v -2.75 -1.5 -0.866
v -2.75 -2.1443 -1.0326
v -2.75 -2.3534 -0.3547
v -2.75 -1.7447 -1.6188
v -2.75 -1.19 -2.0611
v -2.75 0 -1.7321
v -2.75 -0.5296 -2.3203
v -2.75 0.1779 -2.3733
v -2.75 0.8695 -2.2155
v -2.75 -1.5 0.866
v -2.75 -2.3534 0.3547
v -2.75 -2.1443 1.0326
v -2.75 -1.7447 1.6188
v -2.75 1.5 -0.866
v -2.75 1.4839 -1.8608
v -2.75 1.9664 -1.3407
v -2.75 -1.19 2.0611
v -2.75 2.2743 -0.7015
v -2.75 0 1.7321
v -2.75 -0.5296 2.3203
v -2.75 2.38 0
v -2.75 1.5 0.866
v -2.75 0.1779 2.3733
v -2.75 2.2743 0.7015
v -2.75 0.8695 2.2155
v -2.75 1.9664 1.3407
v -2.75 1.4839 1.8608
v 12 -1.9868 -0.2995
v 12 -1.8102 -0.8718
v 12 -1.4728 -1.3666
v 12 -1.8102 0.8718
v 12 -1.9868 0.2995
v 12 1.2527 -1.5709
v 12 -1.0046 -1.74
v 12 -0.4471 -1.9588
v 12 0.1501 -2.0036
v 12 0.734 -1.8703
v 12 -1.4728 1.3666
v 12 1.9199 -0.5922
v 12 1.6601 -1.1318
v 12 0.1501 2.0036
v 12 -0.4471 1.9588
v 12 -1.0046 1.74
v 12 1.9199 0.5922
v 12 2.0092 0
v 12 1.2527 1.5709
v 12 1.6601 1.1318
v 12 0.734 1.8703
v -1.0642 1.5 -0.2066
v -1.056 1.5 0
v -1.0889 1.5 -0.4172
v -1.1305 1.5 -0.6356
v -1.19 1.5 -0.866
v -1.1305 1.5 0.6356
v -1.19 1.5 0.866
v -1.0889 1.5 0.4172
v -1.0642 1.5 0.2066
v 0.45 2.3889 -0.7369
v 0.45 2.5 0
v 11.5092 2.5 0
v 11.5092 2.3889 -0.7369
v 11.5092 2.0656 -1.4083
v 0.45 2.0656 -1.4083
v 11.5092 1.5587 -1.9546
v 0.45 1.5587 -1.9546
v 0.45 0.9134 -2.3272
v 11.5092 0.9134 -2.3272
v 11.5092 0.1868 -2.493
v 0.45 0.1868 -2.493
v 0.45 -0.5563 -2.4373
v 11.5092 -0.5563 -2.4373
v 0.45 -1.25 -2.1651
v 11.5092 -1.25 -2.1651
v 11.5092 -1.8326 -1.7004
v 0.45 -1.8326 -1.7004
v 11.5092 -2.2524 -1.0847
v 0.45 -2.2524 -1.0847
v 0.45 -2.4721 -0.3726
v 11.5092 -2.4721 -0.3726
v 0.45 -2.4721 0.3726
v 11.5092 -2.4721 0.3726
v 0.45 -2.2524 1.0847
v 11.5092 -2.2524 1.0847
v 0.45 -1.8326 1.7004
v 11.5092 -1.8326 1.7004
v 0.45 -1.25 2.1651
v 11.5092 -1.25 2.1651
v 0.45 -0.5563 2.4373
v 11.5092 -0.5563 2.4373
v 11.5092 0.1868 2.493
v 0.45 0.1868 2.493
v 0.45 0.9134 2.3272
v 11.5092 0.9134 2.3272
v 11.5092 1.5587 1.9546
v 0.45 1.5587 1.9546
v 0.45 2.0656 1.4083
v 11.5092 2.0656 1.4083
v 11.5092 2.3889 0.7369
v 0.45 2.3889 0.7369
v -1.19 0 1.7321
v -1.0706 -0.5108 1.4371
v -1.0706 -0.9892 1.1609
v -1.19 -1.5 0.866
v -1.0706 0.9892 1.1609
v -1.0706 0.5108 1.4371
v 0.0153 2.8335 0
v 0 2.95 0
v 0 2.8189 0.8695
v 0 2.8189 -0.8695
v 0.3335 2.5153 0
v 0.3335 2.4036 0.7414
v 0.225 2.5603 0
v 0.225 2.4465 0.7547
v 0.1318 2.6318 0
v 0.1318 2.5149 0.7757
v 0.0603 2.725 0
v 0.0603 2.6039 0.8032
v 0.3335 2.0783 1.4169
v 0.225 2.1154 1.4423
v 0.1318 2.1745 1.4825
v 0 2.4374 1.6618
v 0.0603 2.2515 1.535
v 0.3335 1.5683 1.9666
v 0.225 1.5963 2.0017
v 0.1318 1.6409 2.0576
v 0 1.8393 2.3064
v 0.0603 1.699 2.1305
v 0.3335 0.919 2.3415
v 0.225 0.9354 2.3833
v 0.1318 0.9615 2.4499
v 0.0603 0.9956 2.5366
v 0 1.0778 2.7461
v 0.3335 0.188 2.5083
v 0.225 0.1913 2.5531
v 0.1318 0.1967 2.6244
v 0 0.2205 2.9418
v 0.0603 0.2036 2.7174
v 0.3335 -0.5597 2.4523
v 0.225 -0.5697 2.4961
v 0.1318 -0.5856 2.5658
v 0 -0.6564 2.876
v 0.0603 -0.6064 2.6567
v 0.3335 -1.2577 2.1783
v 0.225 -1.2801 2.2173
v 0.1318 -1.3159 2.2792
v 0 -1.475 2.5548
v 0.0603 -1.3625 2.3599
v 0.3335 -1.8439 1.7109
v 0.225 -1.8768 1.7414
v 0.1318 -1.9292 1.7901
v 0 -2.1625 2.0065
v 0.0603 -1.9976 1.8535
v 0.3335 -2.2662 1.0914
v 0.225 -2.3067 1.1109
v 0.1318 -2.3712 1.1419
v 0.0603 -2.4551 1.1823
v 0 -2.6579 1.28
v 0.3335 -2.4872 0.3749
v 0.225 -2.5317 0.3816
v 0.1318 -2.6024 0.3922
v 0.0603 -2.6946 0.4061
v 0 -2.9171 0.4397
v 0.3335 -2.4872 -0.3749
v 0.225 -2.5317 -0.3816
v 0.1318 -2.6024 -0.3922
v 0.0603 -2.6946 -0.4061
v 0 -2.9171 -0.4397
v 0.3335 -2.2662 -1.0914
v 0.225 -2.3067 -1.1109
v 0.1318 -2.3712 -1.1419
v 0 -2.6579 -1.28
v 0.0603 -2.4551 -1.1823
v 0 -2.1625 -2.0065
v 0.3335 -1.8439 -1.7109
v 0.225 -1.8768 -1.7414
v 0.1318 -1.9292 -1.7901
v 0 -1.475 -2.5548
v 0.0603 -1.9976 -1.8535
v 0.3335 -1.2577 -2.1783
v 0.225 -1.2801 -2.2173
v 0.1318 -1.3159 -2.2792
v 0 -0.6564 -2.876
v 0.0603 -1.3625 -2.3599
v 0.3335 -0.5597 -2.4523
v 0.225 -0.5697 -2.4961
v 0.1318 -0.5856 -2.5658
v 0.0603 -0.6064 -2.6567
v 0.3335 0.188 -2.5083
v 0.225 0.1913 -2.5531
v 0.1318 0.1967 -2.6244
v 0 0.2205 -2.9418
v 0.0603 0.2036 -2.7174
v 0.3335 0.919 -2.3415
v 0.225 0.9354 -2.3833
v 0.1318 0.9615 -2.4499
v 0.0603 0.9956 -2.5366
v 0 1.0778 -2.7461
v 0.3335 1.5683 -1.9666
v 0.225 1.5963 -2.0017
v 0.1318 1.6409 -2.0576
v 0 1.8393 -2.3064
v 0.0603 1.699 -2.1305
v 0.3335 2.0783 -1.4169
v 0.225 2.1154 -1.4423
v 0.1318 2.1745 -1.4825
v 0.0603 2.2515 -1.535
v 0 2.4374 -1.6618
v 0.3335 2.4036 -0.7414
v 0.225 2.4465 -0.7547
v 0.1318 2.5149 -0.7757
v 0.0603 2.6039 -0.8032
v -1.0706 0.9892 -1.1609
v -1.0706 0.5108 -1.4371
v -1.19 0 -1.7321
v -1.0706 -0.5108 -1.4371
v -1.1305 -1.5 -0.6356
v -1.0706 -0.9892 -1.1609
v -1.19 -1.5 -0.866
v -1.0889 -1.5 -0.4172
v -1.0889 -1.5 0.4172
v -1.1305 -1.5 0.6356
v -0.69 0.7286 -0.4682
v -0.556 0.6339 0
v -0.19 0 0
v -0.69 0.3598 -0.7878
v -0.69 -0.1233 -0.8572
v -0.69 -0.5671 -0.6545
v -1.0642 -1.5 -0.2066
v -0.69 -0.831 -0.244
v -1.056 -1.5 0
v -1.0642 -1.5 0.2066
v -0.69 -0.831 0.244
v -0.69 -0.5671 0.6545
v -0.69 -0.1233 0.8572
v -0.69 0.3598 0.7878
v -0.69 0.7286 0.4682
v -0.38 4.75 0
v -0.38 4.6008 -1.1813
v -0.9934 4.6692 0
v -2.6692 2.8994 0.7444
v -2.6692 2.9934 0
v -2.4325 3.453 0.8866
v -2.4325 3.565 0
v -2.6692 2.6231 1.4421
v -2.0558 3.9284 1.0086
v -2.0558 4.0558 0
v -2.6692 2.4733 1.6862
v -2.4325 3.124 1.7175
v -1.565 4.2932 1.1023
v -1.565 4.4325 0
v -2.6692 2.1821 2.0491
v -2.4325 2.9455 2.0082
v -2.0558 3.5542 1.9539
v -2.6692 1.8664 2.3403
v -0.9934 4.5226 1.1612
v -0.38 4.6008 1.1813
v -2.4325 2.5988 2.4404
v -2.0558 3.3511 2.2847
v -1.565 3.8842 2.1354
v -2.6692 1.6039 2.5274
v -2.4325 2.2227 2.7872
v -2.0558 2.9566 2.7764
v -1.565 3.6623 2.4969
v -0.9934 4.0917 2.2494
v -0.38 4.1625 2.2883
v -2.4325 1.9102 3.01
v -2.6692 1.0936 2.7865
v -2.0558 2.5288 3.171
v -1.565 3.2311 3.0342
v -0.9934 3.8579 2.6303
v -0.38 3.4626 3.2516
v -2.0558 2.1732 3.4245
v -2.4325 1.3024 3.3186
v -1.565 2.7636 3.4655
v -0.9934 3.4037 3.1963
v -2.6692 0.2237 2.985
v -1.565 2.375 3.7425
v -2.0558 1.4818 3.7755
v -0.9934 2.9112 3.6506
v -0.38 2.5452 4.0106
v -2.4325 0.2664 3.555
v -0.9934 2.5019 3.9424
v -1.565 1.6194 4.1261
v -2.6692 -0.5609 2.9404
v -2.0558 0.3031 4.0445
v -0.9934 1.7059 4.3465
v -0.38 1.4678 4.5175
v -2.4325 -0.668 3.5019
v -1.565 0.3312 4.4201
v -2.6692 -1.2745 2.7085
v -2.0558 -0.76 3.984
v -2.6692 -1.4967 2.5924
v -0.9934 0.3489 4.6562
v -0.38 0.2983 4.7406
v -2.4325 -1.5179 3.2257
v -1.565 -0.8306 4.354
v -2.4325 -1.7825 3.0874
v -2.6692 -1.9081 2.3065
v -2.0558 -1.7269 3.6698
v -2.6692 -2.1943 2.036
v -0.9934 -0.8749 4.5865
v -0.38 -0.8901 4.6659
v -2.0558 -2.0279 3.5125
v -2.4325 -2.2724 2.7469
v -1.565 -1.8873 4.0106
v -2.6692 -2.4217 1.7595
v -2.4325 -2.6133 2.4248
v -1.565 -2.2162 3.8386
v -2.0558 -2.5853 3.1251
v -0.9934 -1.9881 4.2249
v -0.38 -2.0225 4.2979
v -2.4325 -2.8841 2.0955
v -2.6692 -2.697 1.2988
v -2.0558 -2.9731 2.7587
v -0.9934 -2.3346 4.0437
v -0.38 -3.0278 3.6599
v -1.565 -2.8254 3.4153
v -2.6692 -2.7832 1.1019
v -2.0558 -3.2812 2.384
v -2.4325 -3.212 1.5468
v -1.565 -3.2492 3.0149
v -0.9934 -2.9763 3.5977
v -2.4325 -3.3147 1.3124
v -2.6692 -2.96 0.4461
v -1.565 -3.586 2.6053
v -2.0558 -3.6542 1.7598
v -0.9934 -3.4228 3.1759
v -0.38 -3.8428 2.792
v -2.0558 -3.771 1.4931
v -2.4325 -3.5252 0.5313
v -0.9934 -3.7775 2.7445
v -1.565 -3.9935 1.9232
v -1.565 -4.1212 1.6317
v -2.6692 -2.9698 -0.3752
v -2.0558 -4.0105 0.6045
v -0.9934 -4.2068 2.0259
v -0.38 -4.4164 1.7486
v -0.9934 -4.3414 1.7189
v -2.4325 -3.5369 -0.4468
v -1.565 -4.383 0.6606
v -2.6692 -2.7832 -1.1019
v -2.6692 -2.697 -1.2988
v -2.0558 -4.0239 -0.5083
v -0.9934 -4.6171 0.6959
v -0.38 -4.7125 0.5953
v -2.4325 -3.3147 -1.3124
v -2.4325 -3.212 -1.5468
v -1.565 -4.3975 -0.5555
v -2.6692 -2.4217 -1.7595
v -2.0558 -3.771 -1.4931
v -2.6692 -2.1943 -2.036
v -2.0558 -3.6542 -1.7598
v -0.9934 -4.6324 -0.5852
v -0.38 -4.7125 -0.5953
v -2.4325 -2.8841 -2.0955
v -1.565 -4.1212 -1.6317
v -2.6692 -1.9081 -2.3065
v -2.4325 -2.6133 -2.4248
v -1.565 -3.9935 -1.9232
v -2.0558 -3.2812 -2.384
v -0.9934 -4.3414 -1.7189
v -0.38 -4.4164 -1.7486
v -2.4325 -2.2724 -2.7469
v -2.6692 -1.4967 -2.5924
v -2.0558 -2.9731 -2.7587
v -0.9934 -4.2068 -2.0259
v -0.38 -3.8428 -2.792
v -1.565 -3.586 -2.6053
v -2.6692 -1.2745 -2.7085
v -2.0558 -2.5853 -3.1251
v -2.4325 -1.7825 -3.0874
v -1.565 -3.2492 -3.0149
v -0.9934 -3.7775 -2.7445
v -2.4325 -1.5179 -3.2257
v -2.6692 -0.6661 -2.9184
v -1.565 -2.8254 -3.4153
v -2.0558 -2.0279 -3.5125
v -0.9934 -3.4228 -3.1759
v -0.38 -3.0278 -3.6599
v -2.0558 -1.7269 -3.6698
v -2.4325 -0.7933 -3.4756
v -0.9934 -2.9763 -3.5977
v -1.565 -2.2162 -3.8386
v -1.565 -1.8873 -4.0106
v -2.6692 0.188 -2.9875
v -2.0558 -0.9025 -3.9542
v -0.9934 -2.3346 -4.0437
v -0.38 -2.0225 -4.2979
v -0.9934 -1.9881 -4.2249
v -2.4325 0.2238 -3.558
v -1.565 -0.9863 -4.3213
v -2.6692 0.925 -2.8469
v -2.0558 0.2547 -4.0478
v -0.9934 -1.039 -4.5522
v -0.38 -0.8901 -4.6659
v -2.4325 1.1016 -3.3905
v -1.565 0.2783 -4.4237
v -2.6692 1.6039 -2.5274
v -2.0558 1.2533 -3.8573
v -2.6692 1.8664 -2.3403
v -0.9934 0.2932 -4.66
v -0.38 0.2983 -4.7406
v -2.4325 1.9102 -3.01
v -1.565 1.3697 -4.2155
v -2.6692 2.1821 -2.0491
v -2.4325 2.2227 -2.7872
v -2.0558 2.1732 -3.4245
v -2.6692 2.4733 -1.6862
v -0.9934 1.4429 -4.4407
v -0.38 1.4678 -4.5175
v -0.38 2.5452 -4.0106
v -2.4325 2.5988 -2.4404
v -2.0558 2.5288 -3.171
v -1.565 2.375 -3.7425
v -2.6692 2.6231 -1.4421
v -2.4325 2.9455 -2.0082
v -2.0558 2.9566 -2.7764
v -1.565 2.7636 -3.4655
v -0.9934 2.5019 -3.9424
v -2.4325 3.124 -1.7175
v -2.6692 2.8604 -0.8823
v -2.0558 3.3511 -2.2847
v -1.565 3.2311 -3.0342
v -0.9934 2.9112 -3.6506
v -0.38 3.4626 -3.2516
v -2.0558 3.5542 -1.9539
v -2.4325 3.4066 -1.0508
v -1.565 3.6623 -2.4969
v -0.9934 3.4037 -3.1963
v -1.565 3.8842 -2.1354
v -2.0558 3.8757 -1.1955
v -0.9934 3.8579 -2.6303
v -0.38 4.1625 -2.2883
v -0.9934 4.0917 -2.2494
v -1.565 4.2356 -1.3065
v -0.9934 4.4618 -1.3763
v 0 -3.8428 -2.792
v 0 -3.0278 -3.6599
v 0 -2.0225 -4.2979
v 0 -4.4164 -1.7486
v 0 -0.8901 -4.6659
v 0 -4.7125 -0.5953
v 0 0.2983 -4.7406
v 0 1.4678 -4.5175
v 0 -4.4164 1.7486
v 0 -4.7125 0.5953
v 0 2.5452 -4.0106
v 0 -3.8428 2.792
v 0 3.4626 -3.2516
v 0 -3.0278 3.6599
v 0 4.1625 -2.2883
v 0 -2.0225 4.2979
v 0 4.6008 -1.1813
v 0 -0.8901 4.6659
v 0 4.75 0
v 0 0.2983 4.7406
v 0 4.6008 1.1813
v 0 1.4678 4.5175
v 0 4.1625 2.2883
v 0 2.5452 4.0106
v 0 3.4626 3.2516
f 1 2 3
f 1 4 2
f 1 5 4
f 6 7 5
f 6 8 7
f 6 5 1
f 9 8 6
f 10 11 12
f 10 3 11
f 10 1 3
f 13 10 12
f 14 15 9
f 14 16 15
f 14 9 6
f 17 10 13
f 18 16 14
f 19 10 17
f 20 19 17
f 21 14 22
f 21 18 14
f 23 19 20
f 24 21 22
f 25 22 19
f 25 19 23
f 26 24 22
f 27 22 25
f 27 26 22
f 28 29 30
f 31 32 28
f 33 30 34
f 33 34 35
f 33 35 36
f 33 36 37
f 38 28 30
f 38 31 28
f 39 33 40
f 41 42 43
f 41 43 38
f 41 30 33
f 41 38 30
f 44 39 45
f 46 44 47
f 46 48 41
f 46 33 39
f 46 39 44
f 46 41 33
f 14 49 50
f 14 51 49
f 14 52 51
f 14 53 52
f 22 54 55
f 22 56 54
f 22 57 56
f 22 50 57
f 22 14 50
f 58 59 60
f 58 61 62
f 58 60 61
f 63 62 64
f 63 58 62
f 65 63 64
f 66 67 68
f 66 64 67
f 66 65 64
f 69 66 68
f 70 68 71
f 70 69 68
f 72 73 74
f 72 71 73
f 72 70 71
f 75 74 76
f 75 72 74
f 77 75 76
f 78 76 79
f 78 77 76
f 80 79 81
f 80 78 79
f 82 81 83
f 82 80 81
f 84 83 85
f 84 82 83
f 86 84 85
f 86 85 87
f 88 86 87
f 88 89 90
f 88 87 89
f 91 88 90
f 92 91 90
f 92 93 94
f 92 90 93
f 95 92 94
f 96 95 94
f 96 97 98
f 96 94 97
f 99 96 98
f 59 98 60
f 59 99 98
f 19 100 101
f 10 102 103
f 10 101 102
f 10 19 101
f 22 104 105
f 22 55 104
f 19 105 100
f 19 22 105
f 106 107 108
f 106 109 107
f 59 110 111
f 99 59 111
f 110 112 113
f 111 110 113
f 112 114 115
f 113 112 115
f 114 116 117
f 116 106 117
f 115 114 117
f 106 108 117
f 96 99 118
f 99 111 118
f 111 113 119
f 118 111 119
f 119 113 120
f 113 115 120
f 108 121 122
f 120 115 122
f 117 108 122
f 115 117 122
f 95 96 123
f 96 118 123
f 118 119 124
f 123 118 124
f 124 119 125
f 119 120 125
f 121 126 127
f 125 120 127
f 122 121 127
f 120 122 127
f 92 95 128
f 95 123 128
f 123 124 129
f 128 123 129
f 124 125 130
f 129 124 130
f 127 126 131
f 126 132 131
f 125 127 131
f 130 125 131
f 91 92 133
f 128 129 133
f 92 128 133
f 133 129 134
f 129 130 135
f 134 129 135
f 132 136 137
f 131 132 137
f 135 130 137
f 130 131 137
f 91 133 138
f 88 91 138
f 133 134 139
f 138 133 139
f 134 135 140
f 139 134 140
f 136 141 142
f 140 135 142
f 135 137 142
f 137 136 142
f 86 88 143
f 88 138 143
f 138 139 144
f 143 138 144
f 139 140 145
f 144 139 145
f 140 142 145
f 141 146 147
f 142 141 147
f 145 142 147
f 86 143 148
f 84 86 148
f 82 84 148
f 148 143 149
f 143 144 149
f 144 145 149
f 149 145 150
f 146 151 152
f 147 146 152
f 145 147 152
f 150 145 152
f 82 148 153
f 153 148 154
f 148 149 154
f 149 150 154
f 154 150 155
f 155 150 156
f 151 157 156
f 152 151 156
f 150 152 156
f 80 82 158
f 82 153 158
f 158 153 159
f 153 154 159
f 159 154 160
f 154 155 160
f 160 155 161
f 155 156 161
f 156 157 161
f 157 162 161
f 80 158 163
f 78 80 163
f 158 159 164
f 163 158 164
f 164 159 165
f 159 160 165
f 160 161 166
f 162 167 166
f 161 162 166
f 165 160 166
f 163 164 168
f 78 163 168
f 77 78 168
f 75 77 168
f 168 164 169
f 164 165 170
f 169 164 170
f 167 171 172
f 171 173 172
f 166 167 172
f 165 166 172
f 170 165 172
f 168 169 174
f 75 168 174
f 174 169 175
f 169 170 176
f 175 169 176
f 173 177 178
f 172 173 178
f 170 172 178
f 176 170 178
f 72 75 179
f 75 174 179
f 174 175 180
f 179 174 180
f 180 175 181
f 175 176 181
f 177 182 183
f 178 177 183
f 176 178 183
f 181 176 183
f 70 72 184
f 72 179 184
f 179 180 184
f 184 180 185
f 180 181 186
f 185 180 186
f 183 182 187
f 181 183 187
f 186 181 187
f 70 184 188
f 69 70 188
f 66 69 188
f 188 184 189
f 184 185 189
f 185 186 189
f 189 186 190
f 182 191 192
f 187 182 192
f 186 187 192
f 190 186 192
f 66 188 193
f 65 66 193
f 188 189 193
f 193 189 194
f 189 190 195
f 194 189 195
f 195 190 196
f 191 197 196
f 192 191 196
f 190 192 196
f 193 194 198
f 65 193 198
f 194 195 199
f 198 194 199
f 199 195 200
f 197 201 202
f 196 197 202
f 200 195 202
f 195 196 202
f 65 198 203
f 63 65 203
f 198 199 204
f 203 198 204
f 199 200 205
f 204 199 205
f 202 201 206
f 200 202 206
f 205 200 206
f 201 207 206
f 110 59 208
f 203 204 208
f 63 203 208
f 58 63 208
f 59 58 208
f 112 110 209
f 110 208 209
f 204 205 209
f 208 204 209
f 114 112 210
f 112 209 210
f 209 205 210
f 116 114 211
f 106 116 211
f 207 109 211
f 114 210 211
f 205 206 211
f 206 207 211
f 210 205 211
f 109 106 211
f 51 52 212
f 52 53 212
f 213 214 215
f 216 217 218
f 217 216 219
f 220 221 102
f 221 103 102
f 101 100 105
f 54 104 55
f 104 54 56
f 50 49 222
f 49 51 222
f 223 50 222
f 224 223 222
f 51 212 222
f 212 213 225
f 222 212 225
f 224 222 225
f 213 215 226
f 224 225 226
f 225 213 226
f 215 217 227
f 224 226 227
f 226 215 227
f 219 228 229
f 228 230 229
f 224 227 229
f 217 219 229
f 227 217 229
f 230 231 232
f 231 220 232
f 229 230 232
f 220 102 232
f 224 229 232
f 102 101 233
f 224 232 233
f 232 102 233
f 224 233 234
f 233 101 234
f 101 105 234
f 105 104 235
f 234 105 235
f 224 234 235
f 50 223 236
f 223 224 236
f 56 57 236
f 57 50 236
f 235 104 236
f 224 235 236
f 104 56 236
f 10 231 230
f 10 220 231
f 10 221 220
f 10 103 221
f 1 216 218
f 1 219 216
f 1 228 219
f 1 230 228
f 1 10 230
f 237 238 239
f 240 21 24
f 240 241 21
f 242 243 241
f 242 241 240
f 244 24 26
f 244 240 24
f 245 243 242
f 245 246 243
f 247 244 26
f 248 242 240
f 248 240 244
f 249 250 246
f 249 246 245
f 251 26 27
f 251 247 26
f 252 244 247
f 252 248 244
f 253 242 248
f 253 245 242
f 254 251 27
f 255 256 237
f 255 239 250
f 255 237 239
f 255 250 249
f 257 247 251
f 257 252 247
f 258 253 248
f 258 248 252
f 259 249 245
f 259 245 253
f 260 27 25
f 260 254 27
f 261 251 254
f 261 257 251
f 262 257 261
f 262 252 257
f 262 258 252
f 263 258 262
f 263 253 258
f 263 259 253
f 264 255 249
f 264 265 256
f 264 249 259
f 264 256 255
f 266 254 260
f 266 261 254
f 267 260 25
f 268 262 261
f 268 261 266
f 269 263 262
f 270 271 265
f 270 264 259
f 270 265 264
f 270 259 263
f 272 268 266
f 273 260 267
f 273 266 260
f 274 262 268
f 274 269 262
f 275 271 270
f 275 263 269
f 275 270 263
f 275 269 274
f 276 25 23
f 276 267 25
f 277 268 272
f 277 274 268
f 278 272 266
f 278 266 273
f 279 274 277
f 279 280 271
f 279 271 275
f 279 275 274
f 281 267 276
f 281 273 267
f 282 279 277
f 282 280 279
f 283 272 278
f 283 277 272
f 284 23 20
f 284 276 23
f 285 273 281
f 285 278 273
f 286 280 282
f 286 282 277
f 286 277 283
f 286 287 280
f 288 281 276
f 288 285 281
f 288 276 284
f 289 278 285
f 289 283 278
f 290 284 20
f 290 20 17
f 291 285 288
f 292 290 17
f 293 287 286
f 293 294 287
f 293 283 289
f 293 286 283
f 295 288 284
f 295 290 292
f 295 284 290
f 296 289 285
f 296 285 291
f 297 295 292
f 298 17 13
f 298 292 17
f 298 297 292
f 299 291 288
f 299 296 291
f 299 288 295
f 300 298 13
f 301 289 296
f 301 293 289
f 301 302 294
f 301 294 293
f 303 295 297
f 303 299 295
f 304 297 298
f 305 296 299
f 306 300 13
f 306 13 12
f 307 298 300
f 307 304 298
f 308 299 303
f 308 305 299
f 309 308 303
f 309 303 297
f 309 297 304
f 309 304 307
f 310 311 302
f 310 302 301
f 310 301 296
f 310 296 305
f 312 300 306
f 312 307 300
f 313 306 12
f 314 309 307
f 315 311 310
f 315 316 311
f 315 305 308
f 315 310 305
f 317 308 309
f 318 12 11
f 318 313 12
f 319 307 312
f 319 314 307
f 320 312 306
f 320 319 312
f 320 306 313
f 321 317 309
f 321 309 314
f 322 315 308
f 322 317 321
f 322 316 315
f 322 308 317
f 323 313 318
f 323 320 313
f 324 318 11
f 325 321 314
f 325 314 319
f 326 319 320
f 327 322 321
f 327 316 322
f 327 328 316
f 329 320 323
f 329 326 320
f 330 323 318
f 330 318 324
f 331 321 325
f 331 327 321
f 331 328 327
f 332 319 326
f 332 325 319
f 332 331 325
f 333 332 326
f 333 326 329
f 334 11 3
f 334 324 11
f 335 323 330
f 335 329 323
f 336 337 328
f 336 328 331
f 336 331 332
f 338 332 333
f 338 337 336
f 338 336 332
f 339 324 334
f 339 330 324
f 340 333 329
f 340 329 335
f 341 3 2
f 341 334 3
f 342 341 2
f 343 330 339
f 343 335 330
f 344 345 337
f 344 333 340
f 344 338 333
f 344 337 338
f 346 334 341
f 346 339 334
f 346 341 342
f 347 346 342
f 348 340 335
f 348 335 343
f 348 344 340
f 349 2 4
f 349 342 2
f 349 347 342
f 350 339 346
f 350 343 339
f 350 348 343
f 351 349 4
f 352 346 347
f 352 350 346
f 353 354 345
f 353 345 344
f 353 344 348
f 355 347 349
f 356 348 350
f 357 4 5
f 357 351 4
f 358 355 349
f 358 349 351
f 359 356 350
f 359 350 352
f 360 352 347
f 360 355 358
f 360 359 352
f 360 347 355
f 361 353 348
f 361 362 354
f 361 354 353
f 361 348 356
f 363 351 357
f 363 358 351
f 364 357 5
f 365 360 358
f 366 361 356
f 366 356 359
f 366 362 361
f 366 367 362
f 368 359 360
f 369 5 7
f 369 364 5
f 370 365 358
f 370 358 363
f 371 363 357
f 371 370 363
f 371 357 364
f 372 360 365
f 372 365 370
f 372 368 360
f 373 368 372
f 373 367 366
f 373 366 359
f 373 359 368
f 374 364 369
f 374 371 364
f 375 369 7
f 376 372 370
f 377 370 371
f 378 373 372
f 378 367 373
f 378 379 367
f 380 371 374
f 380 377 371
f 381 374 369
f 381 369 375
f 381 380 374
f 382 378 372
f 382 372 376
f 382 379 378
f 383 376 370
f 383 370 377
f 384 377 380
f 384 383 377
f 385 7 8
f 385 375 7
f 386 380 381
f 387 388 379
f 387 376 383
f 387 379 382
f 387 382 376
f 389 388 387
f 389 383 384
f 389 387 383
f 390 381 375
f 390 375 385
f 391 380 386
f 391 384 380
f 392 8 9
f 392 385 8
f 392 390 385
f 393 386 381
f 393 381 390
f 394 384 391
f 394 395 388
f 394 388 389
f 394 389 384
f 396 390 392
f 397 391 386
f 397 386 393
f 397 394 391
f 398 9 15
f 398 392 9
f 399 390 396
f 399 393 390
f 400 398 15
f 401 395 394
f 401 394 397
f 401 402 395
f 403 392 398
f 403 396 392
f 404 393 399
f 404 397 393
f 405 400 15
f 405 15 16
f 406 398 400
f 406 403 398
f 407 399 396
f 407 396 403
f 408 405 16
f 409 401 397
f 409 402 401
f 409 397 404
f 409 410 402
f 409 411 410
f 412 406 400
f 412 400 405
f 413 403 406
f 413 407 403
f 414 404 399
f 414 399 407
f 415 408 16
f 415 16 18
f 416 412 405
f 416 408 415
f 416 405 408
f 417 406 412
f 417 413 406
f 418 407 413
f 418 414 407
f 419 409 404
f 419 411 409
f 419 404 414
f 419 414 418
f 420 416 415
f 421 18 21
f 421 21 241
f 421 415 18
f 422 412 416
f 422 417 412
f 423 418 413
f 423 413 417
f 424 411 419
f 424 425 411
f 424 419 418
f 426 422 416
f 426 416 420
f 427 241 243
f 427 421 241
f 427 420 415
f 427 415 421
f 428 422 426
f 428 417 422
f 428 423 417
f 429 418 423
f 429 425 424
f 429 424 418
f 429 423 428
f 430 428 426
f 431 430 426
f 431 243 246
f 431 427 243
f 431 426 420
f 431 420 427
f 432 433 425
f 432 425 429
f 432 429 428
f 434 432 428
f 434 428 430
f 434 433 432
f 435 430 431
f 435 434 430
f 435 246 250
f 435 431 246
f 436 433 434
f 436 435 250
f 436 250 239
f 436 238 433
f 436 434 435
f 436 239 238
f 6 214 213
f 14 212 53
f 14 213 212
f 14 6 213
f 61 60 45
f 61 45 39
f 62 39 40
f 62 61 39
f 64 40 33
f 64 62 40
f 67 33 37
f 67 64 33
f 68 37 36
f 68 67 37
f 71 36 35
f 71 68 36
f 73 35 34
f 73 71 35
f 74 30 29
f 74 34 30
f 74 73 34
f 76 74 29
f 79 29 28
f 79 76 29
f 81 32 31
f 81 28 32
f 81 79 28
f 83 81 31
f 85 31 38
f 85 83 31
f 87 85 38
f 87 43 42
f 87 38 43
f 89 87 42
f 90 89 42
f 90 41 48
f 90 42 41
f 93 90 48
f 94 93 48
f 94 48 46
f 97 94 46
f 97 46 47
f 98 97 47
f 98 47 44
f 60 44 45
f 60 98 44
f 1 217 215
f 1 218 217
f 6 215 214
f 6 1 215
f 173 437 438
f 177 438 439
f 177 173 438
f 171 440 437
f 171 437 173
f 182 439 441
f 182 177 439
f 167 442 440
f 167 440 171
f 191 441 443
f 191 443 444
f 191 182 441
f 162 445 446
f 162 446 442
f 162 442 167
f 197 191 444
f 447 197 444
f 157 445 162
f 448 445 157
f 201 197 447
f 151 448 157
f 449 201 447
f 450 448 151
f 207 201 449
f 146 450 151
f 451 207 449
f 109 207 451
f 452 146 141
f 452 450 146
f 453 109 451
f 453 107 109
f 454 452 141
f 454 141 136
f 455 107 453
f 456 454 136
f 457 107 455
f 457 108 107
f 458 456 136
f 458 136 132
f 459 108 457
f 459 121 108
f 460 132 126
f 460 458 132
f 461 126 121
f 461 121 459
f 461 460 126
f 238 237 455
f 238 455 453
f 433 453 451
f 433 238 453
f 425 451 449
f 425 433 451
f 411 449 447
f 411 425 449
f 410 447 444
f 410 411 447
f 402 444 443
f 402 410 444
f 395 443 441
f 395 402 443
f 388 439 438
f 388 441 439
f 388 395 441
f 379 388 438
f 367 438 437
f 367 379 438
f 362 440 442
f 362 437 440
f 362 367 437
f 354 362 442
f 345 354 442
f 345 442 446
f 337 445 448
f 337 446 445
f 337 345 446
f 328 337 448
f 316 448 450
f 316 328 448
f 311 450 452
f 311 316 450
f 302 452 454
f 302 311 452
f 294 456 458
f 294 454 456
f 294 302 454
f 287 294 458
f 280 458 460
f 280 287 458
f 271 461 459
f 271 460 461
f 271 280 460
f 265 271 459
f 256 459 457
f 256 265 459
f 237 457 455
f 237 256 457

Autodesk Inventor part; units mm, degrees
ref_plane "YZ Plane" through (0, 0, 0) normal (1, 0, 0) x (0, 1, 0)
ref_plane "XZ Plane" through (0, 0, 0) normal (0, 1, 0) x (-1, 0, 0)
sketch "Sketch1" plane through (0, 0, 0) normal (0, 0, 1) x (1, 0, 0)
  line L0 (-0.19, 0) -> (12, 0)
  line L1 (12, 0) -> (12, 2.5)
  line L2 (12, 2.5) -> (2.4, 2.5)
  line L3 (2.4, 2.5) -> (1.9091, 2.5)
  line L4 (1.9091, 2.5) -> (0, 2.5)
  line L5 (0, 2.5) -> (0, 4.75)
  line L6 (0, 4.75) -> (-2.75, 4.75)
  line L7 (-2.75, 4.75) -> (-2.75, 1.7321)
  line L8 (-2.75, 1.7321) -> (-1.19, 1.7321)
  line L9 (-1.19, 1.7321) -> (-0.19, 0)
  line L10 (-5.7, 0) -> (14.95, 0) projected
  line L11 (0, -0.95) -> (0, 5.7) projected
  line L12 (2.4, 2.5) -> (0, 2.5) construction
  dimension "d1" = 9.6
  dimension "d2" = 0.4909
  dimension "d3" = 2.75
  dimension "d4" = 1.56
  dimension "d5" = 60
  dimension "d6" = 5
  dimension "d7" = 5
  dimension "d8" = 3.4641
  dimension "d9" = 9.5
  dimension "d26" = 12
revolve "Body" add sketch "Sketch1" angle 360 about axis through (-0.19, 0, 0) along (1, 0, 0)
sketch "Sketch2" plane through (-2.75, 0, 0) normal (-1, 0, 0) x (0, 0, 1)
  circle A0 centre (0, 0) radius 1.7321 projected
  line L0 (0, -6.65) -> (0, 6.65) projected
  line L1 (-6.65, 0) -> (6.65, 0) projected
  line L2 (1.7321, 0) -> (0.866, -1.5)
  line L3 (0.866, -1.5) -> (-0.866, -1.5)
  line L4 (-0.866, -1.5) -> (-1.7321, 0)
  line L5 (-1.7321, 0) -> (-0.866, 1.5)
  line L6 (-0.866, 1.5) -> (0.866, 1.5)
  line L7 (0.866, 1.5) -> (1.7321, 0)
extrude "Slot" add sketch "Sketch2" against normal up to next contours L7 A0 | A0 L2 | L6 L0 A0 | A0 L0 L3 | L0 L6 A0 | A0 L3 L0 | L4 A0 | A0 L5
fillet "Fillet1" radius 2.37 1 edges at (-2.75, -4.75, 0)
thread "Thread" size "M5x0.8" class "6g" standard "ISO Metric profile" length 9.6
chamfer "Chamfer1" distance 0.4908 distance2 0.4908 1 edges at (12, -2.5, 0) measured on face at (12, -0.7741, -0.6858)
ref_plane "Work Plane1" through (29, 0, 0) normal (0, -1, 0) x (1, 0, 0)
fillet "Fillet2" radius 0.45 1 edges at (0, -2.5, 0)
equation "\"d1\" = GEL"
equation "\"d3\" = KOH"
equation "\"d4\" = INTI"
equation "\"d6\" = GD"
equation "\"d7\" = BDM"
equation "\"d8\" = 1.1547 * SW"
equation "\"d9\" = KOD"
equation "\"d26\" = NLG"
equation "\"d30\" = R"
equation "\"d17\" = RR"
equation "\"d13\" = GEL"
equation "\"d15\" = -0.5 * SPD + 0.5 * GD"
equation "\"d16\" = GUL"
equation "\"GD\" = NND"
equation "\"NLG\" = 12"
equation "\"GEL\" = 9.6"
equation "\"KOD\" = 9.5"
equation "\"KOH\" = 2.75"
equation "\"INTI\" = 1.56"
equation "\"GAL\" = 0.61345 * PTC"
equation "\"GUL\" = 0.61345 * PTC"
equation "\"BDM\" = NND"
equation "\"SW\" = 3"
equation "\"RR\" = 2.37"
equation "\"SPD\" = NND - 1.2269 * PTC"
equation "\"R\" = 0.45"
equation "\"TOA\" = 30deg"
equation "\"GD1\" = THREADDIA - 1.2269 * PTC"
equation "\"THREADDIA\" = 5"
equation "\"PTC\" = 0.8"
equation "\"NND\" = 5"
equation "\"KOH1\" = 0.38"
equation "\"E0\" = 3.443"
properties part number "ISO 7380-1 - M5 x 12" material "Steel"
